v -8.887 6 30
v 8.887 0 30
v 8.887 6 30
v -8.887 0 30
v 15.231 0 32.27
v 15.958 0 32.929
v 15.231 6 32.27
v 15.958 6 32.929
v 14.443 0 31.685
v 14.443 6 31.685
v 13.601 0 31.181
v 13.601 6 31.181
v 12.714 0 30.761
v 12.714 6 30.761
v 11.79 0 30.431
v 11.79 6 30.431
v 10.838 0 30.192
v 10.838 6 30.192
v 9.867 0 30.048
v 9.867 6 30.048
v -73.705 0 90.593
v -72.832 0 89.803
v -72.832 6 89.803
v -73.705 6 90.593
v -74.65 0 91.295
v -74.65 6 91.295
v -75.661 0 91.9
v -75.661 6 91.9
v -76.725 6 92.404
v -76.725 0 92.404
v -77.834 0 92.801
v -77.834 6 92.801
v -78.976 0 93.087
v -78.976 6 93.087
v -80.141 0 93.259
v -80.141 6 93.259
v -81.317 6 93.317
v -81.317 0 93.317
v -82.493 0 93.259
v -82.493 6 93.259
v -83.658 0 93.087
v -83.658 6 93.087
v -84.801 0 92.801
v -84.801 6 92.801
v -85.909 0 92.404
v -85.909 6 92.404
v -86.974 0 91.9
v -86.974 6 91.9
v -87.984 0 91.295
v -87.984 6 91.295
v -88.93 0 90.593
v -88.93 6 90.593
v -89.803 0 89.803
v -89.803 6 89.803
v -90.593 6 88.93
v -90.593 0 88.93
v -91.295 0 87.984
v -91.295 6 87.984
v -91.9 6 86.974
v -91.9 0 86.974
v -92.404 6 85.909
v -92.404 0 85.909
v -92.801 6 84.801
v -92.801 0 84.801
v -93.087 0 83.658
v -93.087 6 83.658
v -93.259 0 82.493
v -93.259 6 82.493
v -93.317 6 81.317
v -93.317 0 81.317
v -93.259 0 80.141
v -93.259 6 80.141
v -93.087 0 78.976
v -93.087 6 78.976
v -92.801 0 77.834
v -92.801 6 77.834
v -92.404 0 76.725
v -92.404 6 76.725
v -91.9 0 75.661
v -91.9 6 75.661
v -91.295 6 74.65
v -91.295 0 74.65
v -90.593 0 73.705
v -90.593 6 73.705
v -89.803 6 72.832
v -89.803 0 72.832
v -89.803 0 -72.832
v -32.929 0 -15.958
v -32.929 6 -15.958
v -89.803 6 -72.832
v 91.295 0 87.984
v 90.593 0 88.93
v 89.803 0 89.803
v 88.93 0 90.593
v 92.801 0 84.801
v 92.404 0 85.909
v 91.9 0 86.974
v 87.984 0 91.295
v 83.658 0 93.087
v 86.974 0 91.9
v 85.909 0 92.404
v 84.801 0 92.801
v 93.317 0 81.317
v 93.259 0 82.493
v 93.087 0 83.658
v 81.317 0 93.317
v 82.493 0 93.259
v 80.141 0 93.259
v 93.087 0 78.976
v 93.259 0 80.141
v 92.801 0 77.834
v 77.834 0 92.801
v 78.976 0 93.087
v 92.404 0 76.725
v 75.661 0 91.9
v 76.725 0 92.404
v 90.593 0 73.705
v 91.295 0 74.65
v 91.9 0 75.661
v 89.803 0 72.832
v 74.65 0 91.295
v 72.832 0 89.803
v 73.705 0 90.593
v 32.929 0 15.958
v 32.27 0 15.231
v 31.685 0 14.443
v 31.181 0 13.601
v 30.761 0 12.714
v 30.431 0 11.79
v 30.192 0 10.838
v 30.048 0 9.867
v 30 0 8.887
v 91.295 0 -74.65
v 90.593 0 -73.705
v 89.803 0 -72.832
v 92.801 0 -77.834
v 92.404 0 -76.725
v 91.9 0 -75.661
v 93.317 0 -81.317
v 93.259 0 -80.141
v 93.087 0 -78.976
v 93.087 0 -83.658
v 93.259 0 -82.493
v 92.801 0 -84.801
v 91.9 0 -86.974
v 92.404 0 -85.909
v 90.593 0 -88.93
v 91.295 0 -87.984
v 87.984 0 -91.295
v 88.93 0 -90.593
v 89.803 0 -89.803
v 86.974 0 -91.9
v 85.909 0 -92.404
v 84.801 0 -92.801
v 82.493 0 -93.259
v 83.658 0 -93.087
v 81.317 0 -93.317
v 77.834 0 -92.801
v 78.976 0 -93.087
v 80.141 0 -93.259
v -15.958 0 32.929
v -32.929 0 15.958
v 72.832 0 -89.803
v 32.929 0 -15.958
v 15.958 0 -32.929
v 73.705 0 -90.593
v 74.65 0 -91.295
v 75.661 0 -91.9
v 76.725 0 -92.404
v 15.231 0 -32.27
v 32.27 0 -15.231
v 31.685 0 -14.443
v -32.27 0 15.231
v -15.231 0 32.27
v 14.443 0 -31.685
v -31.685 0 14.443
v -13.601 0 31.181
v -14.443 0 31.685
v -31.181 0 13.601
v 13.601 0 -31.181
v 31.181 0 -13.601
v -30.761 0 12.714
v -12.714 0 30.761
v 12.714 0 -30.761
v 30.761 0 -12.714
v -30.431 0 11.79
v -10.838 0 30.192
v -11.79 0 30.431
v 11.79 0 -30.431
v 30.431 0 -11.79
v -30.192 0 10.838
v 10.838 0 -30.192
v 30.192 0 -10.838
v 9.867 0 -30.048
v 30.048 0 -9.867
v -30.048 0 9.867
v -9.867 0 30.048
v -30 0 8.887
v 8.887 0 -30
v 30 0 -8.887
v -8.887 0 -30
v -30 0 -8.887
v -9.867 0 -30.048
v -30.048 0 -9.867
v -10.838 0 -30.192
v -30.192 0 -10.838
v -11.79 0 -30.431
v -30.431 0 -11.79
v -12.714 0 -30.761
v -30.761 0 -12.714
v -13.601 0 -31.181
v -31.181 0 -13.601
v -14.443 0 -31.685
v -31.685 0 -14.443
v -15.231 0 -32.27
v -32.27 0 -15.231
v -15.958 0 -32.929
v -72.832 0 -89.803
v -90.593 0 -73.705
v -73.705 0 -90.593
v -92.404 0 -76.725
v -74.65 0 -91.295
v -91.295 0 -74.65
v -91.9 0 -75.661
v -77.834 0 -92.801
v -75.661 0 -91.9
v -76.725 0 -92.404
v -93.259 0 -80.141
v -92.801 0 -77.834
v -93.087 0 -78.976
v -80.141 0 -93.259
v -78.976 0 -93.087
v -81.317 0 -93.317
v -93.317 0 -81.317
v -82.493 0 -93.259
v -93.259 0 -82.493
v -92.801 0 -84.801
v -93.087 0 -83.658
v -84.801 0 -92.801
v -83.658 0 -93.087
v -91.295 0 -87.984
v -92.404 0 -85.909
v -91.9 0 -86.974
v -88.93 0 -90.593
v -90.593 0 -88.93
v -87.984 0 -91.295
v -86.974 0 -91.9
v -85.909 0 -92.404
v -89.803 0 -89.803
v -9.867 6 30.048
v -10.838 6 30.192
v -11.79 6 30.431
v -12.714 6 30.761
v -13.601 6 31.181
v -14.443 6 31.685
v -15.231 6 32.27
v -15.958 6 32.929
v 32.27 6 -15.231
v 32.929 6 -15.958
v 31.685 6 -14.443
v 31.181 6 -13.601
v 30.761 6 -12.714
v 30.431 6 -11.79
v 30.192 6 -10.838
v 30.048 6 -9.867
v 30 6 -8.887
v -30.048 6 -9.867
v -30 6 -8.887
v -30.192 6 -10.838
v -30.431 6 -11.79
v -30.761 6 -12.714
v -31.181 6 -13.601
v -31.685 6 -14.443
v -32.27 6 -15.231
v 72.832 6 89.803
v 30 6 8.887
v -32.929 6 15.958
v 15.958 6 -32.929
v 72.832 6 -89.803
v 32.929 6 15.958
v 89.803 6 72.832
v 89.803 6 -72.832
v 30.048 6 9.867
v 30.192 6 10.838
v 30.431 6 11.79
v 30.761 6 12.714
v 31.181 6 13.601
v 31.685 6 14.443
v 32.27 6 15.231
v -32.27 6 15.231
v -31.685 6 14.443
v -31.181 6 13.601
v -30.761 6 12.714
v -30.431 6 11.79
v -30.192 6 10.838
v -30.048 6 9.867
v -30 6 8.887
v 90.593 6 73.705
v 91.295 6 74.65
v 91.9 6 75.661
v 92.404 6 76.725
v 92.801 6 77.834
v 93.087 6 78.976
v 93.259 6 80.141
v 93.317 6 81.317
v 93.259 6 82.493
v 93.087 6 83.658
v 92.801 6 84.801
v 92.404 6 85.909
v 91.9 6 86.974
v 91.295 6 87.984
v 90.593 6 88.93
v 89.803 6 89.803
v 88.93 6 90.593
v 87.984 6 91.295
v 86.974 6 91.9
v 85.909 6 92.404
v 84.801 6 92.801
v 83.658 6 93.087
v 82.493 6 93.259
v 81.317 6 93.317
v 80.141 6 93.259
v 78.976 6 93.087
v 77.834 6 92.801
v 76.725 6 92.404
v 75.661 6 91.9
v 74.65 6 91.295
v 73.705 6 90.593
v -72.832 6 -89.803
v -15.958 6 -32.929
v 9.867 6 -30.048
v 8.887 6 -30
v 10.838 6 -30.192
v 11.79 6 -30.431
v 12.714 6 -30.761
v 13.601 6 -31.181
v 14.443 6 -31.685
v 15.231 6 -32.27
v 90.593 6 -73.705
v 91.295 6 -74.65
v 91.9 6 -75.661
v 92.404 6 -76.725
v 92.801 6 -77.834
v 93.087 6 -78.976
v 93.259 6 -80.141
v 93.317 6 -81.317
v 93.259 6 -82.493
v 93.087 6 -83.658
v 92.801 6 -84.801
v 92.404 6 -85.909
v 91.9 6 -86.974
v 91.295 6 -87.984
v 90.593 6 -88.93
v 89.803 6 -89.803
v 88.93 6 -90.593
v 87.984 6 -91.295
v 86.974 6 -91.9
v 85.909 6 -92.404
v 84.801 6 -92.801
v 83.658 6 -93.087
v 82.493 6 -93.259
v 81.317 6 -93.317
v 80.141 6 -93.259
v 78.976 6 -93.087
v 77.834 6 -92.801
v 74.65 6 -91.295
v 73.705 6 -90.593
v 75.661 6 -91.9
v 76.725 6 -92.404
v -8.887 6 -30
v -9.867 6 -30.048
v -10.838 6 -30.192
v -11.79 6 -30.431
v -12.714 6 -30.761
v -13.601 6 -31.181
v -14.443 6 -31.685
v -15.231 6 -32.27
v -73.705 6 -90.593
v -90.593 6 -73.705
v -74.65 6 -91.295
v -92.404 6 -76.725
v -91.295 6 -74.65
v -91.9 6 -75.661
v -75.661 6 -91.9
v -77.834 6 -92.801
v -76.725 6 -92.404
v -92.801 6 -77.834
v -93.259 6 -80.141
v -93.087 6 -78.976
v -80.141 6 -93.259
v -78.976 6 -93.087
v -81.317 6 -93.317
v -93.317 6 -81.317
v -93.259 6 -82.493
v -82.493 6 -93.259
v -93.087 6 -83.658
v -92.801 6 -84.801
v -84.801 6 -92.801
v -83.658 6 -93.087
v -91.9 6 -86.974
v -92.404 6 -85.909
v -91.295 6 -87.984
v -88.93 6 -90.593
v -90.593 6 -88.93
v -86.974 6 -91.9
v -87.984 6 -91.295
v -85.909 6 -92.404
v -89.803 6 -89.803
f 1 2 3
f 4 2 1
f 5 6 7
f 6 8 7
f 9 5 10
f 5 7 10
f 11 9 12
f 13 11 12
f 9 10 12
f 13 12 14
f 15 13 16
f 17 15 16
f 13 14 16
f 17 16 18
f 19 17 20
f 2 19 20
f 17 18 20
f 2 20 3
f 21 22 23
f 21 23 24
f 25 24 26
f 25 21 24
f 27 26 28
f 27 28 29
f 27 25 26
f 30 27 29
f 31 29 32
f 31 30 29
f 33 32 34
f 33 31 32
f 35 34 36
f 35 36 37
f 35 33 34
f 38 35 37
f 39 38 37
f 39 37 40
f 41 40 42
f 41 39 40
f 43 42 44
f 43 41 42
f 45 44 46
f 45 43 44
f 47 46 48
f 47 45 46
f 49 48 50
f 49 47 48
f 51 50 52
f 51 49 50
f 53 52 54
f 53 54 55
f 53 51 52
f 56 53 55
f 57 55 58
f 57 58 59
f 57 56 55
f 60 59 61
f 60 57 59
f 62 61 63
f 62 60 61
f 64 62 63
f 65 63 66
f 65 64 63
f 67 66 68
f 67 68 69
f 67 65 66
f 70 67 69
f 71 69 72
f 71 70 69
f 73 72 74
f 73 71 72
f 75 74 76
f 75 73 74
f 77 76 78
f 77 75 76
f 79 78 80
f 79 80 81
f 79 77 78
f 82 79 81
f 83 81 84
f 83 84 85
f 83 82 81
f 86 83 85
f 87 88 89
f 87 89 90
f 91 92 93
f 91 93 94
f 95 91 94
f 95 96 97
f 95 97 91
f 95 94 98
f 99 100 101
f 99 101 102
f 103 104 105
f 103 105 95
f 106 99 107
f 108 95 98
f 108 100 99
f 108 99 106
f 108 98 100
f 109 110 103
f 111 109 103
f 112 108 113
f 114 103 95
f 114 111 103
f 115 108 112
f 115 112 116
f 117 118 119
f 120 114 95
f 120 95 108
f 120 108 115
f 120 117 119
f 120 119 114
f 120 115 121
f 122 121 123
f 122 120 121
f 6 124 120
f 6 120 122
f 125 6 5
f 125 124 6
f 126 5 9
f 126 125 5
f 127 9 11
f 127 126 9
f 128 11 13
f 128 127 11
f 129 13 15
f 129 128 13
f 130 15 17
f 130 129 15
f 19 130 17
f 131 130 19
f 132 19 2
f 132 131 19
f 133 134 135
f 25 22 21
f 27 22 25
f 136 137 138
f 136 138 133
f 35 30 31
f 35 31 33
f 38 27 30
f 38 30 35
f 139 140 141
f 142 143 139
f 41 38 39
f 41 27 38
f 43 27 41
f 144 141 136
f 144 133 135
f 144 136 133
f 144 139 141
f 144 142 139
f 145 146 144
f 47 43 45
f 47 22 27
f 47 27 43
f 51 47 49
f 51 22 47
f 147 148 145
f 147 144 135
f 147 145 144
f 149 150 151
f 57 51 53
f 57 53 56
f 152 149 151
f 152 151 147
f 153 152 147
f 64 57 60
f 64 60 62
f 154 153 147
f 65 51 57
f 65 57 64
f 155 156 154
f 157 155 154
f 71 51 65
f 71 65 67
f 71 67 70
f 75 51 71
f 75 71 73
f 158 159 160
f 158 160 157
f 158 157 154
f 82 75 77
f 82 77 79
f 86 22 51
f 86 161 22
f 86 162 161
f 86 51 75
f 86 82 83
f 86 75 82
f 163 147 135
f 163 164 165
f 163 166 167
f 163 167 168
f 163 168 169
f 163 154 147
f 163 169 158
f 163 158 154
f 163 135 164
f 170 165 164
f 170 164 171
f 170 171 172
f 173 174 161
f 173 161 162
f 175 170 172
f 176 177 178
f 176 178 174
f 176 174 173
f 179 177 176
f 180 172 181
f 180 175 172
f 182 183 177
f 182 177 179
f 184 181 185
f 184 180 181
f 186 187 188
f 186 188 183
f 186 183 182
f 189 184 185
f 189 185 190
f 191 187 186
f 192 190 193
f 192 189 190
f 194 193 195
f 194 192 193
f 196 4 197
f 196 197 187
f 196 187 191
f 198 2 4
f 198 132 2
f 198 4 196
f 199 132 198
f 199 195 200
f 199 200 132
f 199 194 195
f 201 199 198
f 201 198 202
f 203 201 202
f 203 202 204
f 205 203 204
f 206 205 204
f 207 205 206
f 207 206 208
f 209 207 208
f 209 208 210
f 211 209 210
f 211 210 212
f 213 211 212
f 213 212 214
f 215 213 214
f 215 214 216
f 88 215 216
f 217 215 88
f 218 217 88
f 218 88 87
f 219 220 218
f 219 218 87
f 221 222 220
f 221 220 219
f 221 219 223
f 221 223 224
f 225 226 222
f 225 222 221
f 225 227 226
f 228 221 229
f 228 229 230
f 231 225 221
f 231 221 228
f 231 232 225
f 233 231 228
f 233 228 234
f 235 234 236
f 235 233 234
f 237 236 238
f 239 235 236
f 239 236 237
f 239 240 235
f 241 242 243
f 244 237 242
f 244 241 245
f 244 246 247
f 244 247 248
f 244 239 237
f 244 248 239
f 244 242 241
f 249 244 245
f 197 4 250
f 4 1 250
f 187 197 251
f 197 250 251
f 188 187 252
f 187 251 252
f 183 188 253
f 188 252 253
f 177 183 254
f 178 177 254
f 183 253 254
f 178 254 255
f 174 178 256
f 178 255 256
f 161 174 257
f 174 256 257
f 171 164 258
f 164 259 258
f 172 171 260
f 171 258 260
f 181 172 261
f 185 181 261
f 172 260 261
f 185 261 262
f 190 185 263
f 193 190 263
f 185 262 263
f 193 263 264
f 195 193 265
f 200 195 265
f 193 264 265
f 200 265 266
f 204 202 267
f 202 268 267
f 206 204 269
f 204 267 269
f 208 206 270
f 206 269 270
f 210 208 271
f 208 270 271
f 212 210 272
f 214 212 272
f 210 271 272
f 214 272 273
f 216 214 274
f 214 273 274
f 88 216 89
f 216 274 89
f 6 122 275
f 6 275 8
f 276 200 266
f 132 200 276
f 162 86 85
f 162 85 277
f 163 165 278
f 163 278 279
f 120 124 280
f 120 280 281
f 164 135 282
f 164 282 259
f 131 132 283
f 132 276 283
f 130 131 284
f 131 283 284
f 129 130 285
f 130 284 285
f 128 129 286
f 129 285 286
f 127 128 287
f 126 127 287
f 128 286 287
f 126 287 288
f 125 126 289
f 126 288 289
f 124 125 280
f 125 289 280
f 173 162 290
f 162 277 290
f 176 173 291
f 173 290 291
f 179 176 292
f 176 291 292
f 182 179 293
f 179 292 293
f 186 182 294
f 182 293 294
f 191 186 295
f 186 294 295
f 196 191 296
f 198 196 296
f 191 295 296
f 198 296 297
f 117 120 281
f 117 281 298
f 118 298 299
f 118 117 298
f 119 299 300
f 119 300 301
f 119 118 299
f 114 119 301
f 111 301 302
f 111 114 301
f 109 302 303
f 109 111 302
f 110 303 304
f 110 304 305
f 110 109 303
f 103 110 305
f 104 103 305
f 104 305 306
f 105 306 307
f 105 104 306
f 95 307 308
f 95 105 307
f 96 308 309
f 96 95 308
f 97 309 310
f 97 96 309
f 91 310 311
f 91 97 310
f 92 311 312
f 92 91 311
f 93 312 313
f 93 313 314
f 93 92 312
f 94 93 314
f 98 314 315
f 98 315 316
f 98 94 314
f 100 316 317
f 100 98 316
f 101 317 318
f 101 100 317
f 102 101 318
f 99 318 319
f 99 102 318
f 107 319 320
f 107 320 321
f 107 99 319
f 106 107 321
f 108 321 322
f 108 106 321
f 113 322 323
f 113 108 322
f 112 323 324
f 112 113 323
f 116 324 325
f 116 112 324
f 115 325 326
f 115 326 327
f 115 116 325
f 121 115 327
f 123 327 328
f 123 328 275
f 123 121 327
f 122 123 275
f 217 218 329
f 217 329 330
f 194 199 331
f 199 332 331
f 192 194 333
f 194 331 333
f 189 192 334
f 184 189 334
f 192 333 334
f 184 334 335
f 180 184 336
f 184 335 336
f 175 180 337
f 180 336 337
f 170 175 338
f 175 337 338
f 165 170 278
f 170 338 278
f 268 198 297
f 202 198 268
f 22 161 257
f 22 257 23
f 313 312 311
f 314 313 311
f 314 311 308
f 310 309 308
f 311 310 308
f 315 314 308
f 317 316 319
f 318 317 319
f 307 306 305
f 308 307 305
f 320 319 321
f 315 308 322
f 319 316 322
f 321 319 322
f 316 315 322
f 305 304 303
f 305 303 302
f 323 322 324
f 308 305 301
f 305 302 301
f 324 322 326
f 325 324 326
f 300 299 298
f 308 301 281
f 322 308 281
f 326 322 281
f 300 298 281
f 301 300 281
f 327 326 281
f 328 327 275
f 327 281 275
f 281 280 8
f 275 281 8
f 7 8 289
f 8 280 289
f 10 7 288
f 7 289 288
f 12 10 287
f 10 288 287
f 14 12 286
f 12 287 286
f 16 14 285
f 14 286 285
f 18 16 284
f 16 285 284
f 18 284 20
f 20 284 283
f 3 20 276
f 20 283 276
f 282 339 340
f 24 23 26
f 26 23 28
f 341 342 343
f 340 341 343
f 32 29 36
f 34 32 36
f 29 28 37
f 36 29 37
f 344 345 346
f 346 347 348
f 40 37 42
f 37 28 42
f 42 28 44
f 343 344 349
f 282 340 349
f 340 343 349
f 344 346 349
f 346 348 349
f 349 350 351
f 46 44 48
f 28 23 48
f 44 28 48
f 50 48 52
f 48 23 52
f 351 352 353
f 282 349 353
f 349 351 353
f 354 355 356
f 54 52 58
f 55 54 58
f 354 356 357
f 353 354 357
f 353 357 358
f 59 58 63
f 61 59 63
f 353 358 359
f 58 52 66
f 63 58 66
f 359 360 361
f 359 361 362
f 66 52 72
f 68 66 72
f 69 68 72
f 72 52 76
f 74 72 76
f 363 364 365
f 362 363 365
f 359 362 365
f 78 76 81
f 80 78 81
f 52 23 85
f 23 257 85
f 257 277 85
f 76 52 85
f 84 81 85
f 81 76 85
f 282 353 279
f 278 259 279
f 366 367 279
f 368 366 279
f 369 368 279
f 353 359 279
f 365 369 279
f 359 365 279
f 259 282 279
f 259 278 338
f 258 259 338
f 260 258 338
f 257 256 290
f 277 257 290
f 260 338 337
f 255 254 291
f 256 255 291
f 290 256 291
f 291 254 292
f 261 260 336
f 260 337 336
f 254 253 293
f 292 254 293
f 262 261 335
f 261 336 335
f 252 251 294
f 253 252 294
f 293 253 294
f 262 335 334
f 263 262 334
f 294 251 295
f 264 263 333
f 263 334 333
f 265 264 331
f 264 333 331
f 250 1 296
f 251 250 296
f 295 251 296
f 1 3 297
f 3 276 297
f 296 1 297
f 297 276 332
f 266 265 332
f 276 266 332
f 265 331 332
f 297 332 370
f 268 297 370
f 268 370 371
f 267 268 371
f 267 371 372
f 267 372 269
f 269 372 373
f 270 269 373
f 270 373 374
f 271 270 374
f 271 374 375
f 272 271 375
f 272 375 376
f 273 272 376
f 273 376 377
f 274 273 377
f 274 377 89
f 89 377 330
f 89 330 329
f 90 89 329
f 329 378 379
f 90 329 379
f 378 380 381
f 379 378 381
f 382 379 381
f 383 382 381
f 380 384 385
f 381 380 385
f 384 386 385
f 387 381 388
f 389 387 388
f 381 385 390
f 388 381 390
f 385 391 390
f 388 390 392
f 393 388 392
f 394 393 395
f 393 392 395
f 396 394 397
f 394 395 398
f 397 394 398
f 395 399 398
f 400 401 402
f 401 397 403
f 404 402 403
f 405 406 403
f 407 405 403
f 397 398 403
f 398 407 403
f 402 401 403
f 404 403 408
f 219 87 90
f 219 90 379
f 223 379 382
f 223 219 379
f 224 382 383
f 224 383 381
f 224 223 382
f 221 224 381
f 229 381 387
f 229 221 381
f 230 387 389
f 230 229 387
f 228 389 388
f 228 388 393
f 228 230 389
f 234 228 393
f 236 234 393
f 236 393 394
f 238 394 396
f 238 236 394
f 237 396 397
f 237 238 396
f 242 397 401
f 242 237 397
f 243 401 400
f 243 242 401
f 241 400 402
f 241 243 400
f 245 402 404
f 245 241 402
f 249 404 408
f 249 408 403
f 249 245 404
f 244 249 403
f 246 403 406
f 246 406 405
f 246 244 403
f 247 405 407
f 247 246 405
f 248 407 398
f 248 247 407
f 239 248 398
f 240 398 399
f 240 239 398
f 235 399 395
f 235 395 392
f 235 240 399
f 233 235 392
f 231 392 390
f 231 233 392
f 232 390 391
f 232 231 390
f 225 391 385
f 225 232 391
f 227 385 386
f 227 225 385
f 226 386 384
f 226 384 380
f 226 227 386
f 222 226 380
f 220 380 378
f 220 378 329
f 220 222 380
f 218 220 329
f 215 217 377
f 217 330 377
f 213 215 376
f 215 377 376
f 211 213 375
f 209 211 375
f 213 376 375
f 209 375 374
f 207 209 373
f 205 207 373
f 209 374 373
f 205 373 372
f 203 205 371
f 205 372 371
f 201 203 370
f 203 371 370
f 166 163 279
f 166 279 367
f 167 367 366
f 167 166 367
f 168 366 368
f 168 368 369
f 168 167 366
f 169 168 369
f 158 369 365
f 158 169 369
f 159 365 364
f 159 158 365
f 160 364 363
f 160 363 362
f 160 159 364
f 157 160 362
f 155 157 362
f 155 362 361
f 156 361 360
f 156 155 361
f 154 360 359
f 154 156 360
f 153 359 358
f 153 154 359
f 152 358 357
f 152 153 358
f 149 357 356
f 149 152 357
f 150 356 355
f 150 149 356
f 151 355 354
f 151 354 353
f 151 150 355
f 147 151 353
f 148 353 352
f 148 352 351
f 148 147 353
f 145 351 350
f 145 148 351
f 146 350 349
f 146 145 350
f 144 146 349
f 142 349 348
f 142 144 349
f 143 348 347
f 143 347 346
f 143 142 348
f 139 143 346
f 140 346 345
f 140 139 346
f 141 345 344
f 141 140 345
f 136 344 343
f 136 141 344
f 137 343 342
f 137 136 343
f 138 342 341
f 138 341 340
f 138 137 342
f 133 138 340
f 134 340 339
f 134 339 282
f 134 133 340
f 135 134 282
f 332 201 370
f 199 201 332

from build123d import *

# Parameters (mm, degrees)
BOSS_EXTRUDE1_DEPTH = 6
FILLET1_R           = 10


with BuildPart() as part:
    # Sketch1 → Boss-Extrude1 (new body)
    with BuildSketch(Plane(origin=(0, 0, 0), x_dir=(1, 0, 0), z_dir=(0, 1, 0))):
        with BuildLine():
            Line((-72.831998462, 89.802561211), (-13.029437252, 30))
            Line((-13.029437252, 30), (13.029437252, 30))
            Line((13.029437252, 30), (72.831998462, 89.802561211))
            ThreePointArc((72.831998462, 89.802561211), (89.802561211, 89.802561211), (89.802561211, 72.831998462))
            Line((89.802561211, 72.831998462), (30, 13.029437252))
            Line((30, 13.029437252), (30, -13.029437252))
            Line((30, -13.029437252), (89.802561211, -72.831998462))
            ThreePointArc((89.802561211, -72.831998462), (89.802561211, -89.802561211), (72.831998462, -89.802561211))
            Line((72.831998462, -89.802561211), (13.029437252, -30))
            Line((13.029437252, -30), (-13.029437252, -30))
            Line((-13.029437252, -30), (-72.831998462, -89.802561211))
            ThreePointArc((-72.831998462, -89.802561211), (-89.802561211, -89.802561211), (-89.802561211, -72.831998462))
            Line((-89.802561211, -72.831998462), (-30, -13.029437252))
            Line((-30, -13.029437252), (-30, 13.029437252))
            Line((-30, 13.029437252), (-89.802561211, 72.831998462))
            ThreePointArc((-89.802561211, 72.831998462), (-89.802561211, 89.802561211), (-72.831998462, 89.802561211))
        make_face()
    extrude(amount=BOSS_EXTRUDE1_DEPTH)

    # Fillet1
    fillet1_edges = [part.edges().sort_by_distance(p)[0] for p in [
        (-13.029437252, 3, -30),
        (13.029437252, 3, -30),
        (30, 3, -13.029437252),
        (30, 3, 13.029437252),
        (13.029437252, 3, 30),
        (-13.029437252, 3, 30),
        (-30, 3, 13.029437252),
        (-30, 3, -13.029437252),
    ]]
    fillet(fillet1_edges, radius=FILLET1_R)


solid = part.part
